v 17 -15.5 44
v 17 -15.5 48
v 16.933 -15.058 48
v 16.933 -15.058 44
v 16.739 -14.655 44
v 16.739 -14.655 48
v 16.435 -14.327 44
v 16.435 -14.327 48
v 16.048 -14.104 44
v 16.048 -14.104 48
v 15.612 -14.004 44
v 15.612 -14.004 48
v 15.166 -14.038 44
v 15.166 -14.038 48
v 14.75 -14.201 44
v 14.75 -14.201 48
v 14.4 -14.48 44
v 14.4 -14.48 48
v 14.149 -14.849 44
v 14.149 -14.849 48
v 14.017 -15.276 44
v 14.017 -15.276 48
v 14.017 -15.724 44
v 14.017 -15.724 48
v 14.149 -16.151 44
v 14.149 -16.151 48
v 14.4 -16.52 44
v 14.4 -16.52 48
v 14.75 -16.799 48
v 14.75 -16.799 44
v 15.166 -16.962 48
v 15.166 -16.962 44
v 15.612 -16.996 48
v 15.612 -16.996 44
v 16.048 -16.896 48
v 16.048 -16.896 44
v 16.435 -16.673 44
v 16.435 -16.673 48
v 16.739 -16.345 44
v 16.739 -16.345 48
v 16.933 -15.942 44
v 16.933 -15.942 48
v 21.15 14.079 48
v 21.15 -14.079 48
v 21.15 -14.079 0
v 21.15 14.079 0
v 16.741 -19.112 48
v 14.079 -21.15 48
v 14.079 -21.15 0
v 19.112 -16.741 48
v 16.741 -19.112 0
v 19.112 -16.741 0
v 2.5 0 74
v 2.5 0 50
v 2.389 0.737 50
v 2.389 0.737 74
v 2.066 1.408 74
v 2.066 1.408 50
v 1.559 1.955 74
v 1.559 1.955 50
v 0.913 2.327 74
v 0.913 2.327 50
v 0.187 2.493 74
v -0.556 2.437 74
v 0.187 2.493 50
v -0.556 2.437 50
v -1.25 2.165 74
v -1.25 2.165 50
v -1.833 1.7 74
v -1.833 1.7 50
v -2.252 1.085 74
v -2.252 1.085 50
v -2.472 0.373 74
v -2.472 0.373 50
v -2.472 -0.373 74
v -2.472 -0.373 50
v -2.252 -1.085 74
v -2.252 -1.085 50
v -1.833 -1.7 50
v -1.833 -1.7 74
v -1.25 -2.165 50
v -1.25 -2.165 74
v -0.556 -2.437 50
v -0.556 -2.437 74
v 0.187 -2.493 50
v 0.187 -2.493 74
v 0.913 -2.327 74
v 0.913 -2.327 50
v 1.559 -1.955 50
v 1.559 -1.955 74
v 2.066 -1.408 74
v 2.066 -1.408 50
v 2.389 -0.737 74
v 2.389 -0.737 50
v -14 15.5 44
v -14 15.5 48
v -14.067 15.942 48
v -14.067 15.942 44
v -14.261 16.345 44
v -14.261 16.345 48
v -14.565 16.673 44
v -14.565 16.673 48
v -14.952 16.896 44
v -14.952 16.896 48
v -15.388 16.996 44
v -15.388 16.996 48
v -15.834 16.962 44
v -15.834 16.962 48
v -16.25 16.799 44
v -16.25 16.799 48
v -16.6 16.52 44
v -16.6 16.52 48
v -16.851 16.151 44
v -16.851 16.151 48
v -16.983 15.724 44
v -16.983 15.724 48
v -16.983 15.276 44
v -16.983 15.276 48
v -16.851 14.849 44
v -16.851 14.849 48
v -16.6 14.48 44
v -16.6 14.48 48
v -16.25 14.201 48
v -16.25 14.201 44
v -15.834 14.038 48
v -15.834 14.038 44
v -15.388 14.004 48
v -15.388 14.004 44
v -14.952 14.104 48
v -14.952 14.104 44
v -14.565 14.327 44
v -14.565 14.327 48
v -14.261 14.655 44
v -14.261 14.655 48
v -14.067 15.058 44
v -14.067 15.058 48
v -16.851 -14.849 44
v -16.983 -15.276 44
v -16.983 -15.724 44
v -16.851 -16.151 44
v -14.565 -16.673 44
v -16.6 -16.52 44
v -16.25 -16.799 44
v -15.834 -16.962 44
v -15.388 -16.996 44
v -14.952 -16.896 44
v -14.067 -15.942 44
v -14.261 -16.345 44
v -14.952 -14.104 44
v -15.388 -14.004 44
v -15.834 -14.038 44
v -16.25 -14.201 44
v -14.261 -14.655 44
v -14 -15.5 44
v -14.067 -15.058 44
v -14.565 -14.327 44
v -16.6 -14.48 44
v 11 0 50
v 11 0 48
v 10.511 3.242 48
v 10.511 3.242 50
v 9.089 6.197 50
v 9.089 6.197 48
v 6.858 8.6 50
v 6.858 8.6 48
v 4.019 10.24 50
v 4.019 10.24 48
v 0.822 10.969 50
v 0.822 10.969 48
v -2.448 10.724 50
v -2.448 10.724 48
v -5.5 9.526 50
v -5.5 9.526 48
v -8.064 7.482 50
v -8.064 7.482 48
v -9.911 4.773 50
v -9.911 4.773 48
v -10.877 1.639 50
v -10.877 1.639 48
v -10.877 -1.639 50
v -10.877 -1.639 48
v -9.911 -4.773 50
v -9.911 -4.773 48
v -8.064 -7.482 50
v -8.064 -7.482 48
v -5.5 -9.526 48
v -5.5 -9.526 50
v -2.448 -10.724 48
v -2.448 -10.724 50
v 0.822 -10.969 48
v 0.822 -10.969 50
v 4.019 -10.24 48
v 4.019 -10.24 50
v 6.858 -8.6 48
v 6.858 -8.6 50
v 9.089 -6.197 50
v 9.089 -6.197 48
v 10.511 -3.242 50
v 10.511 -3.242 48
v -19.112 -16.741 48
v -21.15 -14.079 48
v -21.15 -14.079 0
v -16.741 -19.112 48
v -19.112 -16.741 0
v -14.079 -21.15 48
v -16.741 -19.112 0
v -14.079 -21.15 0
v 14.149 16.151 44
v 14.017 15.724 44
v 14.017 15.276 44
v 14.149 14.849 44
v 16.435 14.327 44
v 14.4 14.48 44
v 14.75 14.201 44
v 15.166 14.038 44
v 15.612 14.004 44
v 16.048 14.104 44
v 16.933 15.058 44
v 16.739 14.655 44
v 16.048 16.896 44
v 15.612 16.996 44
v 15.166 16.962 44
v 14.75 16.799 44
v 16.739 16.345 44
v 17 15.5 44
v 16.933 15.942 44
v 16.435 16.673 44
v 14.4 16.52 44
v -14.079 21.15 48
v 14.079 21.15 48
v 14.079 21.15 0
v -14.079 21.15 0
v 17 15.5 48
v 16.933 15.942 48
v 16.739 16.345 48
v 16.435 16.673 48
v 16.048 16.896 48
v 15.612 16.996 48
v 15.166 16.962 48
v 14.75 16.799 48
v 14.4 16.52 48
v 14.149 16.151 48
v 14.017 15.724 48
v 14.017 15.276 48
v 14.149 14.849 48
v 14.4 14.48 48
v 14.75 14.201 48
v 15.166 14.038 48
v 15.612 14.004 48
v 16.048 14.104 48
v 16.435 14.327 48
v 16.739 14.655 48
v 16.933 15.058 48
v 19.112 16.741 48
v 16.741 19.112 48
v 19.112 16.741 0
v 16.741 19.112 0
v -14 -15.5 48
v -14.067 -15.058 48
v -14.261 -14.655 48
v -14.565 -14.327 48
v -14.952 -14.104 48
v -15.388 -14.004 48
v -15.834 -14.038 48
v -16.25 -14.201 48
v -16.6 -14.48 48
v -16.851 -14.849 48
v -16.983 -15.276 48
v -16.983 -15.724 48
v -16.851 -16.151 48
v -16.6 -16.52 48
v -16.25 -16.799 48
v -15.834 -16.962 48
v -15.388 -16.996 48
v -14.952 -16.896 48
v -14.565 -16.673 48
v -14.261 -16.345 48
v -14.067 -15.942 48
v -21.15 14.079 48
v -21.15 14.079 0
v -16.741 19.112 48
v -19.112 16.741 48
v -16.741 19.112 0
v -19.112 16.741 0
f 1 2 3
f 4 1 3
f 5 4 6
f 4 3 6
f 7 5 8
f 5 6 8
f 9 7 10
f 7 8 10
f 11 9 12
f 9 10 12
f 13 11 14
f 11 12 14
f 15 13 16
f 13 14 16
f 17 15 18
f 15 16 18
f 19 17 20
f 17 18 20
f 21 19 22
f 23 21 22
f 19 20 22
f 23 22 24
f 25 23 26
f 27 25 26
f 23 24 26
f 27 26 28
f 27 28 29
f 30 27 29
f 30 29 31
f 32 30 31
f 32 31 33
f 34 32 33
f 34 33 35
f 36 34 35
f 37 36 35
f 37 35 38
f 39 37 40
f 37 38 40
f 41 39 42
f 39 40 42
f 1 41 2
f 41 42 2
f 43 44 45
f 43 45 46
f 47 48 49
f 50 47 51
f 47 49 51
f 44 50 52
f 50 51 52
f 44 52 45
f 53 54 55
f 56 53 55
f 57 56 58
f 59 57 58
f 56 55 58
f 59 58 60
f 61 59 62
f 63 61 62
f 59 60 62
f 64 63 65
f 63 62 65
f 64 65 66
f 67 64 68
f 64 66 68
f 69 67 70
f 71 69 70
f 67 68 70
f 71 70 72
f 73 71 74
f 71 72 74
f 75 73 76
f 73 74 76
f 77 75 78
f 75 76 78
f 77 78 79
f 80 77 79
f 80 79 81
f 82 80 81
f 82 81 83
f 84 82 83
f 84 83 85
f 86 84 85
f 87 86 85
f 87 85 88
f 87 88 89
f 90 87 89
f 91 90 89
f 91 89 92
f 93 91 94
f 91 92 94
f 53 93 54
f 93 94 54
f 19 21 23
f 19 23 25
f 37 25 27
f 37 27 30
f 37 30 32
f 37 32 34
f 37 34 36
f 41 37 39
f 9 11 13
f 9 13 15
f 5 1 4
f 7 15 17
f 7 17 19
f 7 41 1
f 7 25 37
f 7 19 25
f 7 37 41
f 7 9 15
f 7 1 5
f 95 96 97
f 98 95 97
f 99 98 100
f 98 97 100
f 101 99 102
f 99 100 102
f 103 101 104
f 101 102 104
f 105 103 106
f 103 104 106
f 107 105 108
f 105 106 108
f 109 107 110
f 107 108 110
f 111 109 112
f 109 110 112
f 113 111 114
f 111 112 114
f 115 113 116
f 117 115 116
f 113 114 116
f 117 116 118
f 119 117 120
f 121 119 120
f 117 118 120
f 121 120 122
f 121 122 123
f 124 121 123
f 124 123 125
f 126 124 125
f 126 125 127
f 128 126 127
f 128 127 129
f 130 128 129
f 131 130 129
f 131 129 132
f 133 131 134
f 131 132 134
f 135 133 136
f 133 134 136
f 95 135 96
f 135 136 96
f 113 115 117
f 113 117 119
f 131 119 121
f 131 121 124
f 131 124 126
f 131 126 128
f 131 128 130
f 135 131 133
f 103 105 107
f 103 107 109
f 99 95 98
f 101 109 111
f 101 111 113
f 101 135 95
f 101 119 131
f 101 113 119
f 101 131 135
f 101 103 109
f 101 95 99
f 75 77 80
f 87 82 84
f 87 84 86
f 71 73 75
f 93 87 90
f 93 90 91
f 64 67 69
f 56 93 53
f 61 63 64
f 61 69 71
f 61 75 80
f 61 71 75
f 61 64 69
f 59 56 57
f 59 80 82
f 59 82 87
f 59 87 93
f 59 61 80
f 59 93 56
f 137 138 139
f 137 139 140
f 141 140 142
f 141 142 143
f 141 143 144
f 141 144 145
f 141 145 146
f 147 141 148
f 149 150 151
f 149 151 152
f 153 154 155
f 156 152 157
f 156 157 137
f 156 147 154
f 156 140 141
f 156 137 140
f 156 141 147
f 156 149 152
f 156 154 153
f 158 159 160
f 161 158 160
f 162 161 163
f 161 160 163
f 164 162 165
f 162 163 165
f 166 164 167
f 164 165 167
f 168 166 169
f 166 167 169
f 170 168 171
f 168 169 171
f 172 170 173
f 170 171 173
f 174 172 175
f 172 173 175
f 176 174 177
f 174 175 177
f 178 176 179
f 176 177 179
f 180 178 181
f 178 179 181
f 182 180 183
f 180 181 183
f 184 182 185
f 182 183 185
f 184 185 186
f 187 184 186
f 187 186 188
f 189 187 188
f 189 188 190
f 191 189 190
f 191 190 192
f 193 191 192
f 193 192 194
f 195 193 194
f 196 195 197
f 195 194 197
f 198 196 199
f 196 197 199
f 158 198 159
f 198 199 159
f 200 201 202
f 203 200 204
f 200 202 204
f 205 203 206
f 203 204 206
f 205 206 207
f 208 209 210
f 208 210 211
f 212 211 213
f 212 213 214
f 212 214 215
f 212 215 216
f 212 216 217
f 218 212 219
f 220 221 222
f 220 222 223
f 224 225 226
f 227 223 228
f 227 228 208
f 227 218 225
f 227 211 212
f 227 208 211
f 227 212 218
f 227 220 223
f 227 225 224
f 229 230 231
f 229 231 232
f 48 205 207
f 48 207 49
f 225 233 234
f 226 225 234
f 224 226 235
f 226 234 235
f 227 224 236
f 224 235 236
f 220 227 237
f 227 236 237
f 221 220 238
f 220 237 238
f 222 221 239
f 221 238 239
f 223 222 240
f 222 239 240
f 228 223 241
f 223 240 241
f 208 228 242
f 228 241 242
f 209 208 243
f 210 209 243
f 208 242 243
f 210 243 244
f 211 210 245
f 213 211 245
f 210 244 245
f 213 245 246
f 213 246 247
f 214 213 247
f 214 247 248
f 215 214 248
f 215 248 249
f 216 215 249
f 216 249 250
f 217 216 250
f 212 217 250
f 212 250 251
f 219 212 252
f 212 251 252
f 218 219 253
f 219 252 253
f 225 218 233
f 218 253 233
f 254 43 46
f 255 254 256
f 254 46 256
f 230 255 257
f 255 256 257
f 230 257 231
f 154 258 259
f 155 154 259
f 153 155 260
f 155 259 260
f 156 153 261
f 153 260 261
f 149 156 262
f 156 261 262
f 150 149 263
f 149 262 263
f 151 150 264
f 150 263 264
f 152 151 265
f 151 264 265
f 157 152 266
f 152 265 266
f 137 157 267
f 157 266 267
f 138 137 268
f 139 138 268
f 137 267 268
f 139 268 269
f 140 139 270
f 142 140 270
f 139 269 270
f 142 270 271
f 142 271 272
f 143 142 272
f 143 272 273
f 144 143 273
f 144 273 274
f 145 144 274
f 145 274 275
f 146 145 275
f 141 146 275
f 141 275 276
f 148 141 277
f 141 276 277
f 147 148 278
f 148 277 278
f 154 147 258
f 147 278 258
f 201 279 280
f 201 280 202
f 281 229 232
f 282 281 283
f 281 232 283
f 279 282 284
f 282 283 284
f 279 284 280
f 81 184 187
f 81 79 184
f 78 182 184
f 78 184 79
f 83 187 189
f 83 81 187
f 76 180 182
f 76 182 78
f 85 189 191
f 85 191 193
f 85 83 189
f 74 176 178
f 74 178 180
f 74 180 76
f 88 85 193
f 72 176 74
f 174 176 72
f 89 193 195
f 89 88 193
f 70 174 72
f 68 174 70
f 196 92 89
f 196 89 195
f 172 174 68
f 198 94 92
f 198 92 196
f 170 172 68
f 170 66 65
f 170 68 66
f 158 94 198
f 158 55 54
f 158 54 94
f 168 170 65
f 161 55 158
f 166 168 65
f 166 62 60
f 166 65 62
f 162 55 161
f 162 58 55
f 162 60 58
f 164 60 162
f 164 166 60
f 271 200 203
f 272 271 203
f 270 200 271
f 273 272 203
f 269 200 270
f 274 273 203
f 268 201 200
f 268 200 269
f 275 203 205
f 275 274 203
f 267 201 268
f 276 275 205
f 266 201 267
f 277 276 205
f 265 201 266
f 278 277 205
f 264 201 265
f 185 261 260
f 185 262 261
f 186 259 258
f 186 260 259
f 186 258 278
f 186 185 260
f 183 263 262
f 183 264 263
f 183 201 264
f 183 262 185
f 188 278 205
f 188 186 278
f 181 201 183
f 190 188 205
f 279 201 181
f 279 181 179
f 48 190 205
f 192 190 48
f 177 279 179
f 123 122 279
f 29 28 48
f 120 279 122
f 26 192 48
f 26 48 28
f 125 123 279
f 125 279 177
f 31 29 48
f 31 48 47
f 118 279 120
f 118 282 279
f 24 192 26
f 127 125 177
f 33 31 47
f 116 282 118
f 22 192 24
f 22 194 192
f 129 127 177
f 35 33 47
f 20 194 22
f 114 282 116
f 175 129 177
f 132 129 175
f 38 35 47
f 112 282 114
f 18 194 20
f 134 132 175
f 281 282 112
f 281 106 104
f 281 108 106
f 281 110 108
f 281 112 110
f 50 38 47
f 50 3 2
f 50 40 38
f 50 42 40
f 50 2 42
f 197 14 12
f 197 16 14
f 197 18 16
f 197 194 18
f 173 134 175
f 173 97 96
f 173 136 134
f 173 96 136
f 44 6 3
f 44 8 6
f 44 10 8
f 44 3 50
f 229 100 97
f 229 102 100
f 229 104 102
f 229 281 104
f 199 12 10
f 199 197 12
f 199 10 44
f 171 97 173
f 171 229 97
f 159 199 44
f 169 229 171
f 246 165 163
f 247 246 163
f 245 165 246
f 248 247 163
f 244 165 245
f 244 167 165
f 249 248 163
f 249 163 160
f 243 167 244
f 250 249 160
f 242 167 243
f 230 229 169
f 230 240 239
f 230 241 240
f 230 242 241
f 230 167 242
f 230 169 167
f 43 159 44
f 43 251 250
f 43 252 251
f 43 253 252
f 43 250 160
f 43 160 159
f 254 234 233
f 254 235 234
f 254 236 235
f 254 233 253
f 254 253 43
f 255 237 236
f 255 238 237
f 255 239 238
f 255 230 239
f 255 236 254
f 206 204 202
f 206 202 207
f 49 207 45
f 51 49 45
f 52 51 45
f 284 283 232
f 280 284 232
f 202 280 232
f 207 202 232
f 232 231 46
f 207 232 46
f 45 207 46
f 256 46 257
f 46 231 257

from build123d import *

# Parameters (mm, degrees)
F1_DEPTH = 48
F2_R     = 11
F3_DEPTH = 2
F4_R     = 2.5
F5_DEPTH = 24
F6_R     = 1.5
F7_DEPTH = 4


with BuildPart() as f1:
    # F0 (on Top) → F1 (new body)
    with BuildSketch(Plane.XY):
        with BuildLine():
            ThreePointArc((21.15, 14.078932), (17.965785, 17.965785), (14.078932, 21.15))
            Line((14.078932, 21.15), (-14.078932, 21.15))
            ThreePointArc((-14.078932, 21.15), (-17.965785, 17.965785), (-21.15, 14.078932))
            Line((-21.15, 14.078932), (-21.15, -14.078932))
            ThreePointArc((-21.15, -14.078932), (-17.965785, -17.965785), (-14.078932, -21.15))
            Line((-14.078932, -21.15), (14.078932, -21.15))
            ThreePointArc((14.078932, -21.15), (17.965785, -17.965785), (21.15, -14.078932))
            Line((21.15, -14.078932), (21.15, 14.078932))
        make_face()
    extrude(amount=F1_DEPTH)

    # F2 (on face) → F3 (join)
    with BuildSketch(Plane.XY.offset(48)):
        Circle(F2_R)
    extrude(amount=F3_DEPTH)

    # F4 (on face) → F5 (join)
    with BuildSketch(Plane.XY.offset(50)):
        Circle(F4_R)
    extrude(amount=F5_DEPTH)

    # F6 (on face) → F7 (cut)
    with BuildSketch(Plane.XY.offset(48)):
        with Locations((-15.5, -15.5)):
            Circle(F6_R)
        with Locations((15.5, -15.5)):
            Circle(F6_R)
        with Locations((15.5, 15.5)):
            Circle(F6_R)
        with Locations((-15.5, 15.5)):
            Circle(F6_R)
    extrude(amount=-F7_DEPTH, mode=Mode.SUBTRACT)


solid = f1.part
